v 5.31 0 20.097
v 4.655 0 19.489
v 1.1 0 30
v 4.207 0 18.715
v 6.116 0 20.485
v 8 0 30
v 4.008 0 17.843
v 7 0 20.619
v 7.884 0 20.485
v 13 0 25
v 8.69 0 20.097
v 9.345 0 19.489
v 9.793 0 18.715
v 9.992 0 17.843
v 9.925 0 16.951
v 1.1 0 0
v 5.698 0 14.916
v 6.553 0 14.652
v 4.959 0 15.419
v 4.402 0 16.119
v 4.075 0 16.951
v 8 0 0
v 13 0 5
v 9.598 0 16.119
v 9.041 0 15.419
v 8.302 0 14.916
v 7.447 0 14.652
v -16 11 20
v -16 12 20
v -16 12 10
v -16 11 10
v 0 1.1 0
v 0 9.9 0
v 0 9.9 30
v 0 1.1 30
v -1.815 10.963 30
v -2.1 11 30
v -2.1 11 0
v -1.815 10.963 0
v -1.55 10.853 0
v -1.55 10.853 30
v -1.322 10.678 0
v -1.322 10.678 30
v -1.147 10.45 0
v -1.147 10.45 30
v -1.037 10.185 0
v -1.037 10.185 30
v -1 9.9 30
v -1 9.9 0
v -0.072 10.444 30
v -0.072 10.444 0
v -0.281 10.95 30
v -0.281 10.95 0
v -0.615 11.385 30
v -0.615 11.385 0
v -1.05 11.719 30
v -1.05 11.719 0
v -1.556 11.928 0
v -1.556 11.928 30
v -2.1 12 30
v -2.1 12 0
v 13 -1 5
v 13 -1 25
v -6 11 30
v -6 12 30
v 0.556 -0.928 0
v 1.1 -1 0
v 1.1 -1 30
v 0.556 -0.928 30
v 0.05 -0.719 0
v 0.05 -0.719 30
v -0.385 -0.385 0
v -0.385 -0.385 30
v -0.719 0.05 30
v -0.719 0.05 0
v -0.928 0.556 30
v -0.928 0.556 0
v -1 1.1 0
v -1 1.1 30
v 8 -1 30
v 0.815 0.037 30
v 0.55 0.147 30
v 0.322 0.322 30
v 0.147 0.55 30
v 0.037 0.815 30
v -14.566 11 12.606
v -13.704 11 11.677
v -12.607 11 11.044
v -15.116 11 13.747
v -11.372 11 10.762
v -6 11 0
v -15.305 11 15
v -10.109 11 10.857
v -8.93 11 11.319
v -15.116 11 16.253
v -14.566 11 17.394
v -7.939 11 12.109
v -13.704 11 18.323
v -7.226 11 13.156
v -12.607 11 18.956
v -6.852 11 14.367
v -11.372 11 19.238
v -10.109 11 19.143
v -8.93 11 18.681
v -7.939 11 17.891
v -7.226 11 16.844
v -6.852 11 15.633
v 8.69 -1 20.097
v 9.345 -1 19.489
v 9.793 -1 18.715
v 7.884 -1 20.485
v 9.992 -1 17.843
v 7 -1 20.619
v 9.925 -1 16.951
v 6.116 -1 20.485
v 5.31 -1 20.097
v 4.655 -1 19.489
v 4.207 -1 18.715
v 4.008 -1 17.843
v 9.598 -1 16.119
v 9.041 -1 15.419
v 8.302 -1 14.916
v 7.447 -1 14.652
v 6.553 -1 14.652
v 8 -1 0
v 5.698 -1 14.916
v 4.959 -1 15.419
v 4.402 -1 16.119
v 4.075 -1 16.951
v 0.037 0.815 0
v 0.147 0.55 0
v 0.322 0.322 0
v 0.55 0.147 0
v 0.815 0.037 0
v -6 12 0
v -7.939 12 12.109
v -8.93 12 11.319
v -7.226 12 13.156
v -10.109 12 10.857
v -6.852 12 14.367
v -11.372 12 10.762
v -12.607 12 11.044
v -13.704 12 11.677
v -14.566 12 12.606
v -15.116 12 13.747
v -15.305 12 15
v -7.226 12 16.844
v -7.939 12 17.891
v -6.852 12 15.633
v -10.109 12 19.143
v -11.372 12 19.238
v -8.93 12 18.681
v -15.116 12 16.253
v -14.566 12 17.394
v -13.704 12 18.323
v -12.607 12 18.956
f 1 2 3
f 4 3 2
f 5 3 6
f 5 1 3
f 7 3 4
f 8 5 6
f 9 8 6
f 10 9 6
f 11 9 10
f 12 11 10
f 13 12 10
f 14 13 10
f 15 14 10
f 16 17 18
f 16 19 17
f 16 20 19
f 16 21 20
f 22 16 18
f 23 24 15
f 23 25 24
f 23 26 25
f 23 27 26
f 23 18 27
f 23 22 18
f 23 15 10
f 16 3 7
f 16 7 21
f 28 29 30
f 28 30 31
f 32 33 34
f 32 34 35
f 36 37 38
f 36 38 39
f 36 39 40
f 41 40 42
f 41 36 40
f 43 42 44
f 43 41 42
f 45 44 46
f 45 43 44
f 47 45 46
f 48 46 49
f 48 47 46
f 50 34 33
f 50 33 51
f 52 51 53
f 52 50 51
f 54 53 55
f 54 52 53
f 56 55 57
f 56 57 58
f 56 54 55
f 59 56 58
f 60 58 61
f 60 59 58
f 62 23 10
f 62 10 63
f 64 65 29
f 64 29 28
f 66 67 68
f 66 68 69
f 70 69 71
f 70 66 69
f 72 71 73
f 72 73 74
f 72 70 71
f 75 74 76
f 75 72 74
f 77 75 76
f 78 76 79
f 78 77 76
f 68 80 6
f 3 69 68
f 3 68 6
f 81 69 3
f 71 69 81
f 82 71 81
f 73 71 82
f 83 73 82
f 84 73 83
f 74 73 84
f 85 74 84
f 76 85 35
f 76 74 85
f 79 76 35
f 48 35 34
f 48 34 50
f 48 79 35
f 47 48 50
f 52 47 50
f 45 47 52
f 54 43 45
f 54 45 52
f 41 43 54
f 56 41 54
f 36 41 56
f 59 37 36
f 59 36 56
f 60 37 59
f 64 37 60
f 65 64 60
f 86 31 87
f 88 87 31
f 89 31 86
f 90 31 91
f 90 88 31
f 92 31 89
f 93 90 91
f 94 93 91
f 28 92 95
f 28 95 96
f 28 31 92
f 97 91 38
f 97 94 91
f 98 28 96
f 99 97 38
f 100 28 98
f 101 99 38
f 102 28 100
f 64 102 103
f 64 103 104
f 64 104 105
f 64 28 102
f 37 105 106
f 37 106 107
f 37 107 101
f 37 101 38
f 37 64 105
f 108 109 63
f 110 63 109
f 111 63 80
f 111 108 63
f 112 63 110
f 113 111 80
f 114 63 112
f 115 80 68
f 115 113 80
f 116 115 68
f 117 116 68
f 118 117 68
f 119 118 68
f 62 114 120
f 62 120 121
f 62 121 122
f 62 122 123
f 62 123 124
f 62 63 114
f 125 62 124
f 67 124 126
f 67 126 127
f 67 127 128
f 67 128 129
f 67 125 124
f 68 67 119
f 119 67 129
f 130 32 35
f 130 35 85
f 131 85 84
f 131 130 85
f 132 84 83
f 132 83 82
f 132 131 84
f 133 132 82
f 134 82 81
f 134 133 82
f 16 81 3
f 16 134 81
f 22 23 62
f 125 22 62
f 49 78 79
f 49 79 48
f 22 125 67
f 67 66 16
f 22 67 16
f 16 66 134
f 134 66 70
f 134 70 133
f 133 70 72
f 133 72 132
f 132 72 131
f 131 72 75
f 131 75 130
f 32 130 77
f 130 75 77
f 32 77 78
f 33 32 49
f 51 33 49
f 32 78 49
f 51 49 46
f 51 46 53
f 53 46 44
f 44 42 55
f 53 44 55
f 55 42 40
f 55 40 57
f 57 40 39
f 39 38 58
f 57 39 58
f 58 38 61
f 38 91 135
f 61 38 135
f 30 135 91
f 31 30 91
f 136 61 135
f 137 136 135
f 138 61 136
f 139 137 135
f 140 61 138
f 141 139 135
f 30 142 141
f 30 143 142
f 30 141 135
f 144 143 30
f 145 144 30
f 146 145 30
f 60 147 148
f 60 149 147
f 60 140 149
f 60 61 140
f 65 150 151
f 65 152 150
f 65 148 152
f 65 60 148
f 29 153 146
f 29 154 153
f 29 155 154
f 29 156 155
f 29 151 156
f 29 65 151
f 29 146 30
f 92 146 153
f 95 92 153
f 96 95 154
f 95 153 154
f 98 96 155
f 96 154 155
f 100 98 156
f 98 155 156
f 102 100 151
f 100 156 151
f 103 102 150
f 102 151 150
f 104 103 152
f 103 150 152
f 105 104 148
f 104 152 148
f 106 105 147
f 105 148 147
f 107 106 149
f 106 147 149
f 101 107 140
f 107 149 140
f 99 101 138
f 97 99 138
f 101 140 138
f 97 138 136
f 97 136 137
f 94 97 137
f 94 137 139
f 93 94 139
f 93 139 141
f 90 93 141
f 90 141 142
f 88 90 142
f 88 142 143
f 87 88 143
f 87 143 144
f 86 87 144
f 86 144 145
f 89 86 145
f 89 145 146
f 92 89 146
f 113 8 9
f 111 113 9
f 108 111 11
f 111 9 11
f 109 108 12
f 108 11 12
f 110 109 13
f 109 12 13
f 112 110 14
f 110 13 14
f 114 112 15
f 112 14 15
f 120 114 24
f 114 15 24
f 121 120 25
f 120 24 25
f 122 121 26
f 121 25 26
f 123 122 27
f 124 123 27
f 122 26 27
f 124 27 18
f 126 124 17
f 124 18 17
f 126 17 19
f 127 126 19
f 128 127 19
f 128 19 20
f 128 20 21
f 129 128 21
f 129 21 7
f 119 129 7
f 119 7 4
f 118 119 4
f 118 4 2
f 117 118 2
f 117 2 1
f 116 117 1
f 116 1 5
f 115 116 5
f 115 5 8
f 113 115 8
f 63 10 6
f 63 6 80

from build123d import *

# Parameters (mm, degrees)
SM_BASE_FLANGE_1_DEPTH           = 30
SKETCH_5_R                       = 3
CUT_EXTRUDE_3_DEPTH              = 10
SM_EDGE_FLANGE_1_STRIP_W         = 6.2
SM_EDGE_FLANGE_1_STRIP_H         = 1
SM_EDGE_FLANGE_1_STRIP_CUT_DEPTH = 30
SM_EDGE_FLANGE_1_DEPTH           = 30
CHAMFER_1_SIZE                   = 10
SKETCH_10_R                      = 4.25
CUT_EXTRUDE_4_DEPTH              = 10
CHAMFER_2_SIZE                   = 5


# Sheet-metal steps are written as plain solids
with BuildPart() as part:
    # Sketch 1 → Базовая кромка1 (new body)
    with BuildSketch(Plane.XY):
        with BuildLine():
            Line((0, 12), (0, 1.1))
            ThreePointArc((0, 1.1), (0.322182541, 0.322182541), (1.1, 0))
            Line((1.1, 0), (13, 0))
            Line((13, 0), (13, -1))
            Line((13, -1), (1.1, -1))
            ThreePointArc((1.1, -1), (-0.38492424, -0.38492424), (-1, 1.1))
            Line((-1, 1.1), (-1, 12))
            Line((-1, 12), (0, 12))
        make_face()
    extrude(amount=SM_BASE_FLANGE_1_DEPTH)

    # Эскиз5 → Вырез-Вытянуть3 (cut)
    with BuildSketch(Plane(origin=(0, 0, 0), x_dir=(1, 0, 0), z_dir=(0, 1, 0))):
        with Locations(Location((7, -17.618648825, 0), (0, 0, 270))):
            Circle(SKETCH_5_R)
    extrude(amount=-CUT_EXTRUDE_3_DEPTH, mode=Mode.SUBTRACT)

    # Ребро-кромка1 strip (across the edge) → Ребро-кромка1 strip cut (cut)
    with BuildSketch(Plane(origin=(-1, 12, 30), x_dir=(0, -1, 0), z_dir=(0, 0, -1))):
        with Locations((-1, -0.5)):
            Rectangle(SM_EDGE_FLANGE_1_STRIP_W, SM_EDGE_FLANGE_1_STRIP_H)
    extrude(amount=SM_EDGE_FLANGE_1_STRIP_CUT_DEPTH, mode=Mode.SUBTRACT)

    # Ребро-кромка1 section (across the edge) → Ребро-кромка1 (add)
    with BuildSketch(Plane(origin=(-1, 12, 30), x_dir=(0, -1, 0), z_dir=(0, 0, -1))):
        with BuildLine():
            Line((0, 1.1), (0, 15))
            Line((0, 15), (1, 15))
            Line((1, 15), (1, 1.1))
            ThreePointArc((1, 1.1), (1.322182541, 0.322182541), (2.1, 0))
            Line((2.1, 0), (2.1, -1))
            ThreePointArc((2.1, -1), (0.61507576, -0.38492424), (0, 1.1))
        make_face()
    extrude(amount=SM_EDGE_FLANGE_1_DEPTH)

    # Фаска1
    chamfer_1_edges = [part.edges().sort_by_distance(p)[0] for p in [
        (-16, 11.5, 30),
        (-16, 11.5, 0),
    ]]
    chamfer(chamfer_1_edges, length=CHAMFER_1_SIZE)

    # Эскиз10 → Вырез-Вытянуть4 (cut)
    with BuildSketch(Plane(origin=(0, 12, 0), x_dir=(1, 0, 0), z_dir=(0, 1, 0))):
        with Locations(Location((-11.054624514, -15, 0), (0, 0, 180))):
            Circle(SKETCH_10_R)
    extrude(amount=-CUT_EXTRUDE_4_DEPTH, mode=Mode.SUBTRACT)

    # Фаска2
    chamfer_2_edges = [part.edges().sort_by_distance(p)[0] for p in [
        (13, -0.5, 30),
        (13, -0.5, 0),
    ]]
    chamfer(chamfer_2_edges, length=CHAMFER_2_SIZE)


solid = part.part
